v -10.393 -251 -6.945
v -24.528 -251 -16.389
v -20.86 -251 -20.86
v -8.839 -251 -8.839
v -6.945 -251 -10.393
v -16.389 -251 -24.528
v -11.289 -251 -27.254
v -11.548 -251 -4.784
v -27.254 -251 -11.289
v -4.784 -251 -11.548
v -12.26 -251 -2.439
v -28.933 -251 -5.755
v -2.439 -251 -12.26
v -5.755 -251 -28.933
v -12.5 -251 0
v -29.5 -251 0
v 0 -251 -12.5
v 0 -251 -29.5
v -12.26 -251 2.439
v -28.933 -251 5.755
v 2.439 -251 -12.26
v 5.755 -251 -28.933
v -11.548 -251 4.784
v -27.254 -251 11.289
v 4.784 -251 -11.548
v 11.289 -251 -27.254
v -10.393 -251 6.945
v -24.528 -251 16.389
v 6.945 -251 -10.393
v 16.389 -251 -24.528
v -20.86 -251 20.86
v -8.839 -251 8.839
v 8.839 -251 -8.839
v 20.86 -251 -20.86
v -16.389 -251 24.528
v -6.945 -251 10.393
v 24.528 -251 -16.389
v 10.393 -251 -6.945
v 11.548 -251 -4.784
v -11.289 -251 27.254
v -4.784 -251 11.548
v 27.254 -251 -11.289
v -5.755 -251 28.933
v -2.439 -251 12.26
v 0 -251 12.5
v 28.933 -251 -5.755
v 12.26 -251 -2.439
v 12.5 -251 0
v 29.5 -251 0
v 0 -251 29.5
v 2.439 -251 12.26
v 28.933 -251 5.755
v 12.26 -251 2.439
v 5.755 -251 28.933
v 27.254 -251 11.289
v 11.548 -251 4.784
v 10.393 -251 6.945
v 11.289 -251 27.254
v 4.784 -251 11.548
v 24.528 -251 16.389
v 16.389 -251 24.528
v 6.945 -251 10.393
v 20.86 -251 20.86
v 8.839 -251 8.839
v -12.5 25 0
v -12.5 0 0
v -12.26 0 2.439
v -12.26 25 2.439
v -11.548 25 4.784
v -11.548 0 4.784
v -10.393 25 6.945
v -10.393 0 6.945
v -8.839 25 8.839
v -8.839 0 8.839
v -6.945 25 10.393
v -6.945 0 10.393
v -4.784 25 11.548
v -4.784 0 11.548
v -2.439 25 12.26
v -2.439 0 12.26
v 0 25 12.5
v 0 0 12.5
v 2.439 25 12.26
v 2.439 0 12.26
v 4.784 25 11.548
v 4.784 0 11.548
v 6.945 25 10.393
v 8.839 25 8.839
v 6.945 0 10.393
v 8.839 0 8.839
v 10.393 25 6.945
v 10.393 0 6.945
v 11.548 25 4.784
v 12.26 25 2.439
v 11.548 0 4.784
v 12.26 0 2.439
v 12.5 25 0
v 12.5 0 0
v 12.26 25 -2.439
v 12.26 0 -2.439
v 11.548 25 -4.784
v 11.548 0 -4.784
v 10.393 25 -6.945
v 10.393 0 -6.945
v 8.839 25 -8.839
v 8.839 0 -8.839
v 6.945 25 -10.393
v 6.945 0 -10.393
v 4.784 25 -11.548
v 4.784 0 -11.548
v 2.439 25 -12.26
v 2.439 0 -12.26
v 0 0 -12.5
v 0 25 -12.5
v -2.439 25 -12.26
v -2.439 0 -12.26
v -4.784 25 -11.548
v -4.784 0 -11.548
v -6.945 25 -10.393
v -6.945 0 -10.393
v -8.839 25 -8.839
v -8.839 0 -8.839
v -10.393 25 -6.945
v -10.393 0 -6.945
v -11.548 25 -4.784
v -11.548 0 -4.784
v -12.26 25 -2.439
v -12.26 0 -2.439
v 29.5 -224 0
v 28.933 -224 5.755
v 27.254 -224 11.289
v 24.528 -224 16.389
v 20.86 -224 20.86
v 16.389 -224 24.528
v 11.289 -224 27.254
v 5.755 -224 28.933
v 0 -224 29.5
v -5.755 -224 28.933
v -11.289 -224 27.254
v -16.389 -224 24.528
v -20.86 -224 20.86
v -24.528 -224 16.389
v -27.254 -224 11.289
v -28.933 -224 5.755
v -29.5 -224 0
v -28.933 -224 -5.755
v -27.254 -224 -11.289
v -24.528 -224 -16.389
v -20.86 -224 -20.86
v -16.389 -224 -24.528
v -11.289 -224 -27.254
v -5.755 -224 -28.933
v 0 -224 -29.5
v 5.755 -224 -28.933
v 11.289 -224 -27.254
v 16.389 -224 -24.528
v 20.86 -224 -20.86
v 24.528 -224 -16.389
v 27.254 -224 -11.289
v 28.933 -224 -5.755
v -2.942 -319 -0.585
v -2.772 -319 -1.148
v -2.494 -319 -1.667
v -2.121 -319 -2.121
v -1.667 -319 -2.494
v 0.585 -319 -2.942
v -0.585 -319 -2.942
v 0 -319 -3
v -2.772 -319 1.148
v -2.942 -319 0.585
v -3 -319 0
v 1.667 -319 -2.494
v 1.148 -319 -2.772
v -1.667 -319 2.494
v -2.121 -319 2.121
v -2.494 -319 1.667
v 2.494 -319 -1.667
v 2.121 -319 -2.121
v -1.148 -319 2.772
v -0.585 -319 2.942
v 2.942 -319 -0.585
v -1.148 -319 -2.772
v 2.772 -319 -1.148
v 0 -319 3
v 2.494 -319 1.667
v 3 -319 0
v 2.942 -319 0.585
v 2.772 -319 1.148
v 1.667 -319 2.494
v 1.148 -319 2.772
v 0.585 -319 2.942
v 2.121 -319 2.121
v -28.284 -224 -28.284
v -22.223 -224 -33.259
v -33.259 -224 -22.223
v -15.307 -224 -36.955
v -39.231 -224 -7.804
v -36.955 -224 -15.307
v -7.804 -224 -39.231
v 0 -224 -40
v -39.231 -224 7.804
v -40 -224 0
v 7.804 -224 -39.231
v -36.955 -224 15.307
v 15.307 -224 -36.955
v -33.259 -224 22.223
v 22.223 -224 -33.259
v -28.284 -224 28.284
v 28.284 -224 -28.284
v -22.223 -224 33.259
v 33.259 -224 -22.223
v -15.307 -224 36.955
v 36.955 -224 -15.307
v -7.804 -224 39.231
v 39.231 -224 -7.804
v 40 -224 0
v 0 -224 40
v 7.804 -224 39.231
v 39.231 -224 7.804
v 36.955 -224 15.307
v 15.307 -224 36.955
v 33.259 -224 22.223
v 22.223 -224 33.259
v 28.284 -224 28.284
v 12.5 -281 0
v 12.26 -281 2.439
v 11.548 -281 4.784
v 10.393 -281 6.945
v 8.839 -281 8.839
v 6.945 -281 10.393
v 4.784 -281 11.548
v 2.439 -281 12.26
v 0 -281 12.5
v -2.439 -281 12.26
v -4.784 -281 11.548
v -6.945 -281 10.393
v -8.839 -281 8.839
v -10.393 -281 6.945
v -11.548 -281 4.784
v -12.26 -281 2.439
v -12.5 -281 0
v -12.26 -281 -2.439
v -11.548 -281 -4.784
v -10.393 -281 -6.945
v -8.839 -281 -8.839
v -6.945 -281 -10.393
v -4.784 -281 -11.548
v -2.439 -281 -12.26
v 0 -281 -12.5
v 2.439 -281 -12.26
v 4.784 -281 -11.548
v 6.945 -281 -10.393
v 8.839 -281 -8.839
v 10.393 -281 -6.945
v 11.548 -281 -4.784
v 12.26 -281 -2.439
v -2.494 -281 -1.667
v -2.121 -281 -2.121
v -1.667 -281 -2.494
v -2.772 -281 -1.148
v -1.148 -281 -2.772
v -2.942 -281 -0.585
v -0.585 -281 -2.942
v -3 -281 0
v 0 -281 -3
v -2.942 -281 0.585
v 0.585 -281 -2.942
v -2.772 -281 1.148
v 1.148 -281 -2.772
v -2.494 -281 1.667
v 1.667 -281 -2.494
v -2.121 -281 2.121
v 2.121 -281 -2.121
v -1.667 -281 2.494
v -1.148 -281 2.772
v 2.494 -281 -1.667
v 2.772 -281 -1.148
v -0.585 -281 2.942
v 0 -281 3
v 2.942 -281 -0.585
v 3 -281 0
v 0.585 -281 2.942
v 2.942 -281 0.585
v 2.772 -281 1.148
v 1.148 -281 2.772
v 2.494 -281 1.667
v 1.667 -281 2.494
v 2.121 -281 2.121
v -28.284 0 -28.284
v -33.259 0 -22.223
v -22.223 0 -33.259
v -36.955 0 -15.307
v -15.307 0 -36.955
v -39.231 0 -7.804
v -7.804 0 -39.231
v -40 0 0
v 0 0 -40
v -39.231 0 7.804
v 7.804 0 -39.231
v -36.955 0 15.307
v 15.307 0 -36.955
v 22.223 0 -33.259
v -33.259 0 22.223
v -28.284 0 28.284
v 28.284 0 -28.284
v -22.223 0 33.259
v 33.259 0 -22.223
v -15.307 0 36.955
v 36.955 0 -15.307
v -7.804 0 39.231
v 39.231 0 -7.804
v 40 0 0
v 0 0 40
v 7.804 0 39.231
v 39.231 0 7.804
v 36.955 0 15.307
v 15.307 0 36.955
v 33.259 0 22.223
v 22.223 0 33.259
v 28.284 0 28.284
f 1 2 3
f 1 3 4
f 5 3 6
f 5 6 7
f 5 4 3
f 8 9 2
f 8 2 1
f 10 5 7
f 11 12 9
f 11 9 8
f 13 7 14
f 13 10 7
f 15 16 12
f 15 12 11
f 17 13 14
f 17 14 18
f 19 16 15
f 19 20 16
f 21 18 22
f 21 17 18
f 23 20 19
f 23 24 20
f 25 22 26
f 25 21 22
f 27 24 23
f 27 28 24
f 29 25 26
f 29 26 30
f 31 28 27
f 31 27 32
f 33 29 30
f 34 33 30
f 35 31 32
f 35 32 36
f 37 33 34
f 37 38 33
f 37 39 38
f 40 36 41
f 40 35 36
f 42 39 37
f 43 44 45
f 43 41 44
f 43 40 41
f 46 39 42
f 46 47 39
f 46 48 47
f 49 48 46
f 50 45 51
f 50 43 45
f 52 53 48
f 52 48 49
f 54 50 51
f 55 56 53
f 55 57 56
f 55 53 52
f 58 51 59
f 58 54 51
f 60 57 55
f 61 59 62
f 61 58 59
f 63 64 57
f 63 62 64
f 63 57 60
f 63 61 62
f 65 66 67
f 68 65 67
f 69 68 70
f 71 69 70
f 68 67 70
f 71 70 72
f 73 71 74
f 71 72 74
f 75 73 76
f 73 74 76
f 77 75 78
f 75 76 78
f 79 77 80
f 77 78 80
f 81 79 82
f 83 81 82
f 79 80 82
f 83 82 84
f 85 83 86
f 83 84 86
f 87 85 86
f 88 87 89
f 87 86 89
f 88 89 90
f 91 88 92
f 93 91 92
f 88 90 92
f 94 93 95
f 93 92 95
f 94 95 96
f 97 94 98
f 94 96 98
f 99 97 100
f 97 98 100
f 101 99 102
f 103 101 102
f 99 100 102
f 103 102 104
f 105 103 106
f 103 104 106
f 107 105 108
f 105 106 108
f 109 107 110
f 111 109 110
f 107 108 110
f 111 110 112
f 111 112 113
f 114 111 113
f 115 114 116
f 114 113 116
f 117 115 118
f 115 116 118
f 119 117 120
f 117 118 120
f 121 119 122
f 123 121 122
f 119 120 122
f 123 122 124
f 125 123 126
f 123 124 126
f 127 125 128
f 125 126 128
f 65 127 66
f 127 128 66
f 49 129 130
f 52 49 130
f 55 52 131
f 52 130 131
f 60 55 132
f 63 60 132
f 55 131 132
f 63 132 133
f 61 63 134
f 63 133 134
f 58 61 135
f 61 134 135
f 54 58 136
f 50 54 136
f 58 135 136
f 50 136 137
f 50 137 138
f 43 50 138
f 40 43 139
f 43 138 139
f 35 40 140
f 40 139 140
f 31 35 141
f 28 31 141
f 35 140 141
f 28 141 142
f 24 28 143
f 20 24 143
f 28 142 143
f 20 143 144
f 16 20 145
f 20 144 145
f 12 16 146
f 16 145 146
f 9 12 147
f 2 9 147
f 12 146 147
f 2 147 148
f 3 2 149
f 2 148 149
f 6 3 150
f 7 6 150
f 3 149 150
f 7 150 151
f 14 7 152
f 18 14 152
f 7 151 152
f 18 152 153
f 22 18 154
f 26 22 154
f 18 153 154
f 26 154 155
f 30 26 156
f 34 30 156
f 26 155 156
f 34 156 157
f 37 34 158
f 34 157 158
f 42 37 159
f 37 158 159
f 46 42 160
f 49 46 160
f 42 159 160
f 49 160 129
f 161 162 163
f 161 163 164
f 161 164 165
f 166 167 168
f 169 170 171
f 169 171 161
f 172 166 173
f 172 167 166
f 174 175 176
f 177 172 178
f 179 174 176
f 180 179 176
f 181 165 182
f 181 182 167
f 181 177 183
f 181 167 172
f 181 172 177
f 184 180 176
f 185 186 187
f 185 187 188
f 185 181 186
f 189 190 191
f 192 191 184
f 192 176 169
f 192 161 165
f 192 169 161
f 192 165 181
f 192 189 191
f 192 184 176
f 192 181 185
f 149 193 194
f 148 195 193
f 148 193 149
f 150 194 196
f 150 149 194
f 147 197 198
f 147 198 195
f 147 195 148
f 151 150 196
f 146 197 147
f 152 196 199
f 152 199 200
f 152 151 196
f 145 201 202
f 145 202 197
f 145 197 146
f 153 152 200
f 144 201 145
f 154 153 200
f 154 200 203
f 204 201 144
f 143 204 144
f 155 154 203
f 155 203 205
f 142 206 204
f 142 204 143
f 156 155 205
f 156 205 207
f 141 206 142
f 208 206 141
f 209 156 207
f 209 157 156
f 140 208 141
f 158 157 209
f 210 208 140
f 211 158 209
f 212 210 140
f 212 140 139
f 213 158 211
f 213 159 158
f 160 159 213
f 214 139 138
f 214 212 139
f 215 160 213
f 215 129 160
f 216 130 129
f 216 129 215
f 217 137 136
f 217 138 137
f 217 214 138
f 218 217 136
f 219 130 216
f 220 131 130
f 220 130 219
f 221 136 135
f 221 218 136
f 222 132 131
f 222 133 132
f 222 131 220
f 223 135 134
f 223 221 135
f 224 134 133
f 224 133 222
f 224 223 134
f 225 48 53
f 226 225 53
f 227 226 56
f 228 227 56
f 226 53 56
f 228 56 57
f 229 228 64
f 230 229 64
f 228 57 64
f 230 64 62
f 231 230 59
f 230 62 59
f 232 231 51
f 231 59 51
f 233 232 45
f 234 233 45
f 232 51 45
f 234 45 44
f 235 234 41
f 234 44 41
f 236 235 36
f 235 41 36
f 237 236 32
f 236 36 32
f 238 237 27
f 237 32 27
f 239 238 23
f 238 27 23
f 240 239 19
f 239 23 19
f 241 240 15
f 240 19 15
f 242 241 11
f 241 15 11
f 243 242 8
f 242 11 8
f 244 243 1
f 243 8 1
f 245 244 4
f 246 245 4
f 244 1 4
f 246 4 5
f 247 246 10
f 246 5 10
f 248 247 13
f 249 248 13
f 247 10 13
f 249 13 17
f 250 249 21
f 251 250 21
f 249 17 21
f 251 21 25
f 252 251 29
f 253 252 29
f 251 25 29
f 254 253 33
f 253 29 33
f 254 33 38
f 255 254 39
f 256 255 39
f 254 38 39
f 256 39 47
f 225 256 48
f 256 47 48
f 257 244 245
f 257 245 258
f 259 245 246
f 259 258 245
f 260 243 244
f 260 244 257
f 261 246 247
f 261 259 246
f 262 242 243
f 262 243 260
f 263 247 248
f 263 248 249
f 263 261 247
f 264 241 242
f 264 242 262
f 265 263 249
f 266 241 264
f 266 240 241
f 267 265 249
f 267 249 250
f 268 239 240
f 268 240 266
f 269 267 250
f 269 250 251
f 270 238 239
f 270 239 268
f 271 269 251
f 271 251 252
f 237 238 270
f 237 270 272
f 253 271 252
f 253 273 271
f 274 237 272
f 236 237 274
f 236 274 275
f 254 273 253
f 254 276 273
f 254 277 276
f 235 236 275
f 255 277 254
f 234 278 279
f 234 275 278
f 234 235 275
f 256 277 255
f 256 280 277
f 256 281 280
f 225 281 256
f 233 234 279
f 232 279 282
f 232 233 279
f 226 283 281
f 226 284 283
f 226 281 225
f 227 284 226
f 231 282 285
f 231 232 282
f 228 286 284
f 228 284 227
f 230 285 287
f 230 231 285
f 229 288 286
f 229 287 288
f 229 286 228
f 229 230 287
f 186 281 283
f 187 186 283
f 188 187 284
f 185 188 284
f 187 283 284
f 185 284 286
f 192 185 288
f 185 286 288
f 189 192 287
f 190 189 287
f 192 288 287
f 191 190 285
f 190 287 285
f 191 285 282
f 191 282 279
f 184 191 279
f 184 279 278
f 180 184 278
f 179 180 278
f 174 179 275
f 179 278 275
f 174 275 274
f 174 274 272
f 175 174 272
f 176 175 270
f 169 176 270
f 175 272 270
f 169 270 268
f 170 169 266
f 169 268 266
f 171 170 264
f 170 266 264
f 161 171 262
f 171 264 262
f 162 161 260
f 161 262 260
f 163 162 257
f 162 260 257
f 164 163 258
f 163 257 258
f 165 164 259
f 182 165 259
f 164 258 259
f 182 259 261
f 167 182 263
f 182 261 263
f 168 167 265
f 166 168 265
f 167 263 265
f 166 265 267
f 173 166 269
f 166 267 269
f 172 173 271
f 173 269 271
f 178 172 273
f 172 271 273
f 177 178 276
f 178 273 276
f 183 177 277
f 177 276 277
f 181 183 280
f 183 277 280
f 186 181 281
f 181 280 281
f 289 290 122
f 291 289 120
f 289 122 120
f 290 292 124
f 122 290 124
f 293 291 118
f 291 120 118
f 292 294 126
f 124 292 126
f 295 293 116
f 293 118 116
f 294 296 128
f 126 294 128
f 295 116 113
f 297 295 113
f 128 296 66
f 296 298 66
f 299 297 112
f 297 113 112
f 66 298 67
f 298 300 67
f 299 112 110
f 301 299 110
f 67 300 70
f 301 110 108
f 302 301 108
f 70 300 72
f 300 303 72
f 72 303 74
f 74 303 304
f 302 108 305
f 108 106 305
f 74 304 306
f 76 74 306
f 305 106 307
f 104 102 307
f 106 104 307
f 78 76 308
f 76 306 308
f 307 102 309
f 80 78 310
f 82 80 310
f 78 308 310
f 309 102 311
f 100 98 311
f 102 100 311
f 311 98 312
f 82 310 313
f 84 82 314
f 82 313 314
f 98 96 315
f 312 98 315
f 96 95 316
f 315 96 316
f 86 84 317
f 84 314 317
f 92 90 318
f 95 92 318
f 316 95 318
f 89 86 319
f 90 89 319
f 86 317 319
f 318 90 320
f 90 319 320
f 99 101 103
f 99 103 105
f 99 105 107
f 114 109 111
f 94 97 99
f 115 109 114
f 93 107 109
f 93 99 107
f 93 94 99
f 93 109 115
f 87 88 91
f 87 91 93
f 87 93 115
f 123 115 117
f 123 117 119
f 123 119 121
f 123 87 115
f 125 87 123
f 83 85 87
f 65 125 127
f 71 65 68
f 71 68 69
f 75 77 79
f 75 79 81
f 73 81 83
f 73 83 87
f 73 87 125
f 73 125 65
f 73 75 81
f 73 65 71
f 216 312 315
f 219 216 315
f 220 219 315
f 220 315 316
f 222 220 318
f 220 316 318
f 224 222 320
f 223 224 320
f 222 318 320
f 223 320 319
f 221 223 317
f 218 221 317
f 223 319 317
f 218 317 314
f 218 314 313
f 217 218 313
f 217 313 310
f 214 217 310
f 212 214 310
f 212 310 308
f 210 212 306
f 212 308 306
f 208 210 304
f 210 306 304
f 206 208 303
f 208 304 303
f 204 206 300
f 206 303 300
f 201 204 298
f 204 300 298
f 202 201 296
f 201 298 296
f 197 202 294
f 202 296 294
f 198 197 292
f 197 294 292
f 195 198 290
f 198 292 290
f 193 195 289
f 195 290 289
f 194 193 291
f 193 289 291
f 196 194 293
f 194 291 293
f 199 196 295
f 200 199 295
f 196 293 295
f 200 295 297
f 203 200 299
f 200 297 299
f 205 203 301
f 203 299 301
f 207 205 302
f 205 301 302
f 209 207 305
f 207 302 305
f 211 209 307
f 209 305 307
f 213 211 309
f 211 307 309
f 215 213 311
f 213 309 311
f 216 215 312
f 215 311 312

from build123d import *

# Parameters (mm, degrees)
F0_R     = 40
F1_DEPTH = 224
F2_R     = 29.5
F3_DEPTH = 27
F4_R     = 12.5
F5_DEPTH = 30
F6_R     = 12.5
F7_DEPTH = 25
F8_R     = 3
F9_DEPTH = 38


with BuildPart() as f1:
    # F0 (on Front) → F1 (new body)
    with BuildSketch(Plane.XZ):
        Circle(F0_R)
    extrude(amount=F1_DEPTH)

    # F2 (on face) → F3 (join)
    with BuildSketch(Plane.XZ.offset(224)):
        Circle(F2_R)
    extrude(amount=F3_DEPTH)

    # F4 (on face) → F5 (join)
    with BuildSketch(Plane.XZ.offset(251)):
        Circle(F4_R)
    extrude(amount=F5_DEPTH)

    # F6 (on face) → F7 (join)
    with BuildSketch(Plane(origin=(0, 0, 0), x_dir=(-1, 0, 0), z_dir=(0, 1, 0))):
        Circle(F6_R)
    extrude(amount=F7_DEPTH)

    # F8 (on face) → F9 (join)
    with BuildSketch(Plane.XZ.offset(281)):
        Circle(F8_R)
    extrude(amount=F9_DEPTH)


solid = f1.part
